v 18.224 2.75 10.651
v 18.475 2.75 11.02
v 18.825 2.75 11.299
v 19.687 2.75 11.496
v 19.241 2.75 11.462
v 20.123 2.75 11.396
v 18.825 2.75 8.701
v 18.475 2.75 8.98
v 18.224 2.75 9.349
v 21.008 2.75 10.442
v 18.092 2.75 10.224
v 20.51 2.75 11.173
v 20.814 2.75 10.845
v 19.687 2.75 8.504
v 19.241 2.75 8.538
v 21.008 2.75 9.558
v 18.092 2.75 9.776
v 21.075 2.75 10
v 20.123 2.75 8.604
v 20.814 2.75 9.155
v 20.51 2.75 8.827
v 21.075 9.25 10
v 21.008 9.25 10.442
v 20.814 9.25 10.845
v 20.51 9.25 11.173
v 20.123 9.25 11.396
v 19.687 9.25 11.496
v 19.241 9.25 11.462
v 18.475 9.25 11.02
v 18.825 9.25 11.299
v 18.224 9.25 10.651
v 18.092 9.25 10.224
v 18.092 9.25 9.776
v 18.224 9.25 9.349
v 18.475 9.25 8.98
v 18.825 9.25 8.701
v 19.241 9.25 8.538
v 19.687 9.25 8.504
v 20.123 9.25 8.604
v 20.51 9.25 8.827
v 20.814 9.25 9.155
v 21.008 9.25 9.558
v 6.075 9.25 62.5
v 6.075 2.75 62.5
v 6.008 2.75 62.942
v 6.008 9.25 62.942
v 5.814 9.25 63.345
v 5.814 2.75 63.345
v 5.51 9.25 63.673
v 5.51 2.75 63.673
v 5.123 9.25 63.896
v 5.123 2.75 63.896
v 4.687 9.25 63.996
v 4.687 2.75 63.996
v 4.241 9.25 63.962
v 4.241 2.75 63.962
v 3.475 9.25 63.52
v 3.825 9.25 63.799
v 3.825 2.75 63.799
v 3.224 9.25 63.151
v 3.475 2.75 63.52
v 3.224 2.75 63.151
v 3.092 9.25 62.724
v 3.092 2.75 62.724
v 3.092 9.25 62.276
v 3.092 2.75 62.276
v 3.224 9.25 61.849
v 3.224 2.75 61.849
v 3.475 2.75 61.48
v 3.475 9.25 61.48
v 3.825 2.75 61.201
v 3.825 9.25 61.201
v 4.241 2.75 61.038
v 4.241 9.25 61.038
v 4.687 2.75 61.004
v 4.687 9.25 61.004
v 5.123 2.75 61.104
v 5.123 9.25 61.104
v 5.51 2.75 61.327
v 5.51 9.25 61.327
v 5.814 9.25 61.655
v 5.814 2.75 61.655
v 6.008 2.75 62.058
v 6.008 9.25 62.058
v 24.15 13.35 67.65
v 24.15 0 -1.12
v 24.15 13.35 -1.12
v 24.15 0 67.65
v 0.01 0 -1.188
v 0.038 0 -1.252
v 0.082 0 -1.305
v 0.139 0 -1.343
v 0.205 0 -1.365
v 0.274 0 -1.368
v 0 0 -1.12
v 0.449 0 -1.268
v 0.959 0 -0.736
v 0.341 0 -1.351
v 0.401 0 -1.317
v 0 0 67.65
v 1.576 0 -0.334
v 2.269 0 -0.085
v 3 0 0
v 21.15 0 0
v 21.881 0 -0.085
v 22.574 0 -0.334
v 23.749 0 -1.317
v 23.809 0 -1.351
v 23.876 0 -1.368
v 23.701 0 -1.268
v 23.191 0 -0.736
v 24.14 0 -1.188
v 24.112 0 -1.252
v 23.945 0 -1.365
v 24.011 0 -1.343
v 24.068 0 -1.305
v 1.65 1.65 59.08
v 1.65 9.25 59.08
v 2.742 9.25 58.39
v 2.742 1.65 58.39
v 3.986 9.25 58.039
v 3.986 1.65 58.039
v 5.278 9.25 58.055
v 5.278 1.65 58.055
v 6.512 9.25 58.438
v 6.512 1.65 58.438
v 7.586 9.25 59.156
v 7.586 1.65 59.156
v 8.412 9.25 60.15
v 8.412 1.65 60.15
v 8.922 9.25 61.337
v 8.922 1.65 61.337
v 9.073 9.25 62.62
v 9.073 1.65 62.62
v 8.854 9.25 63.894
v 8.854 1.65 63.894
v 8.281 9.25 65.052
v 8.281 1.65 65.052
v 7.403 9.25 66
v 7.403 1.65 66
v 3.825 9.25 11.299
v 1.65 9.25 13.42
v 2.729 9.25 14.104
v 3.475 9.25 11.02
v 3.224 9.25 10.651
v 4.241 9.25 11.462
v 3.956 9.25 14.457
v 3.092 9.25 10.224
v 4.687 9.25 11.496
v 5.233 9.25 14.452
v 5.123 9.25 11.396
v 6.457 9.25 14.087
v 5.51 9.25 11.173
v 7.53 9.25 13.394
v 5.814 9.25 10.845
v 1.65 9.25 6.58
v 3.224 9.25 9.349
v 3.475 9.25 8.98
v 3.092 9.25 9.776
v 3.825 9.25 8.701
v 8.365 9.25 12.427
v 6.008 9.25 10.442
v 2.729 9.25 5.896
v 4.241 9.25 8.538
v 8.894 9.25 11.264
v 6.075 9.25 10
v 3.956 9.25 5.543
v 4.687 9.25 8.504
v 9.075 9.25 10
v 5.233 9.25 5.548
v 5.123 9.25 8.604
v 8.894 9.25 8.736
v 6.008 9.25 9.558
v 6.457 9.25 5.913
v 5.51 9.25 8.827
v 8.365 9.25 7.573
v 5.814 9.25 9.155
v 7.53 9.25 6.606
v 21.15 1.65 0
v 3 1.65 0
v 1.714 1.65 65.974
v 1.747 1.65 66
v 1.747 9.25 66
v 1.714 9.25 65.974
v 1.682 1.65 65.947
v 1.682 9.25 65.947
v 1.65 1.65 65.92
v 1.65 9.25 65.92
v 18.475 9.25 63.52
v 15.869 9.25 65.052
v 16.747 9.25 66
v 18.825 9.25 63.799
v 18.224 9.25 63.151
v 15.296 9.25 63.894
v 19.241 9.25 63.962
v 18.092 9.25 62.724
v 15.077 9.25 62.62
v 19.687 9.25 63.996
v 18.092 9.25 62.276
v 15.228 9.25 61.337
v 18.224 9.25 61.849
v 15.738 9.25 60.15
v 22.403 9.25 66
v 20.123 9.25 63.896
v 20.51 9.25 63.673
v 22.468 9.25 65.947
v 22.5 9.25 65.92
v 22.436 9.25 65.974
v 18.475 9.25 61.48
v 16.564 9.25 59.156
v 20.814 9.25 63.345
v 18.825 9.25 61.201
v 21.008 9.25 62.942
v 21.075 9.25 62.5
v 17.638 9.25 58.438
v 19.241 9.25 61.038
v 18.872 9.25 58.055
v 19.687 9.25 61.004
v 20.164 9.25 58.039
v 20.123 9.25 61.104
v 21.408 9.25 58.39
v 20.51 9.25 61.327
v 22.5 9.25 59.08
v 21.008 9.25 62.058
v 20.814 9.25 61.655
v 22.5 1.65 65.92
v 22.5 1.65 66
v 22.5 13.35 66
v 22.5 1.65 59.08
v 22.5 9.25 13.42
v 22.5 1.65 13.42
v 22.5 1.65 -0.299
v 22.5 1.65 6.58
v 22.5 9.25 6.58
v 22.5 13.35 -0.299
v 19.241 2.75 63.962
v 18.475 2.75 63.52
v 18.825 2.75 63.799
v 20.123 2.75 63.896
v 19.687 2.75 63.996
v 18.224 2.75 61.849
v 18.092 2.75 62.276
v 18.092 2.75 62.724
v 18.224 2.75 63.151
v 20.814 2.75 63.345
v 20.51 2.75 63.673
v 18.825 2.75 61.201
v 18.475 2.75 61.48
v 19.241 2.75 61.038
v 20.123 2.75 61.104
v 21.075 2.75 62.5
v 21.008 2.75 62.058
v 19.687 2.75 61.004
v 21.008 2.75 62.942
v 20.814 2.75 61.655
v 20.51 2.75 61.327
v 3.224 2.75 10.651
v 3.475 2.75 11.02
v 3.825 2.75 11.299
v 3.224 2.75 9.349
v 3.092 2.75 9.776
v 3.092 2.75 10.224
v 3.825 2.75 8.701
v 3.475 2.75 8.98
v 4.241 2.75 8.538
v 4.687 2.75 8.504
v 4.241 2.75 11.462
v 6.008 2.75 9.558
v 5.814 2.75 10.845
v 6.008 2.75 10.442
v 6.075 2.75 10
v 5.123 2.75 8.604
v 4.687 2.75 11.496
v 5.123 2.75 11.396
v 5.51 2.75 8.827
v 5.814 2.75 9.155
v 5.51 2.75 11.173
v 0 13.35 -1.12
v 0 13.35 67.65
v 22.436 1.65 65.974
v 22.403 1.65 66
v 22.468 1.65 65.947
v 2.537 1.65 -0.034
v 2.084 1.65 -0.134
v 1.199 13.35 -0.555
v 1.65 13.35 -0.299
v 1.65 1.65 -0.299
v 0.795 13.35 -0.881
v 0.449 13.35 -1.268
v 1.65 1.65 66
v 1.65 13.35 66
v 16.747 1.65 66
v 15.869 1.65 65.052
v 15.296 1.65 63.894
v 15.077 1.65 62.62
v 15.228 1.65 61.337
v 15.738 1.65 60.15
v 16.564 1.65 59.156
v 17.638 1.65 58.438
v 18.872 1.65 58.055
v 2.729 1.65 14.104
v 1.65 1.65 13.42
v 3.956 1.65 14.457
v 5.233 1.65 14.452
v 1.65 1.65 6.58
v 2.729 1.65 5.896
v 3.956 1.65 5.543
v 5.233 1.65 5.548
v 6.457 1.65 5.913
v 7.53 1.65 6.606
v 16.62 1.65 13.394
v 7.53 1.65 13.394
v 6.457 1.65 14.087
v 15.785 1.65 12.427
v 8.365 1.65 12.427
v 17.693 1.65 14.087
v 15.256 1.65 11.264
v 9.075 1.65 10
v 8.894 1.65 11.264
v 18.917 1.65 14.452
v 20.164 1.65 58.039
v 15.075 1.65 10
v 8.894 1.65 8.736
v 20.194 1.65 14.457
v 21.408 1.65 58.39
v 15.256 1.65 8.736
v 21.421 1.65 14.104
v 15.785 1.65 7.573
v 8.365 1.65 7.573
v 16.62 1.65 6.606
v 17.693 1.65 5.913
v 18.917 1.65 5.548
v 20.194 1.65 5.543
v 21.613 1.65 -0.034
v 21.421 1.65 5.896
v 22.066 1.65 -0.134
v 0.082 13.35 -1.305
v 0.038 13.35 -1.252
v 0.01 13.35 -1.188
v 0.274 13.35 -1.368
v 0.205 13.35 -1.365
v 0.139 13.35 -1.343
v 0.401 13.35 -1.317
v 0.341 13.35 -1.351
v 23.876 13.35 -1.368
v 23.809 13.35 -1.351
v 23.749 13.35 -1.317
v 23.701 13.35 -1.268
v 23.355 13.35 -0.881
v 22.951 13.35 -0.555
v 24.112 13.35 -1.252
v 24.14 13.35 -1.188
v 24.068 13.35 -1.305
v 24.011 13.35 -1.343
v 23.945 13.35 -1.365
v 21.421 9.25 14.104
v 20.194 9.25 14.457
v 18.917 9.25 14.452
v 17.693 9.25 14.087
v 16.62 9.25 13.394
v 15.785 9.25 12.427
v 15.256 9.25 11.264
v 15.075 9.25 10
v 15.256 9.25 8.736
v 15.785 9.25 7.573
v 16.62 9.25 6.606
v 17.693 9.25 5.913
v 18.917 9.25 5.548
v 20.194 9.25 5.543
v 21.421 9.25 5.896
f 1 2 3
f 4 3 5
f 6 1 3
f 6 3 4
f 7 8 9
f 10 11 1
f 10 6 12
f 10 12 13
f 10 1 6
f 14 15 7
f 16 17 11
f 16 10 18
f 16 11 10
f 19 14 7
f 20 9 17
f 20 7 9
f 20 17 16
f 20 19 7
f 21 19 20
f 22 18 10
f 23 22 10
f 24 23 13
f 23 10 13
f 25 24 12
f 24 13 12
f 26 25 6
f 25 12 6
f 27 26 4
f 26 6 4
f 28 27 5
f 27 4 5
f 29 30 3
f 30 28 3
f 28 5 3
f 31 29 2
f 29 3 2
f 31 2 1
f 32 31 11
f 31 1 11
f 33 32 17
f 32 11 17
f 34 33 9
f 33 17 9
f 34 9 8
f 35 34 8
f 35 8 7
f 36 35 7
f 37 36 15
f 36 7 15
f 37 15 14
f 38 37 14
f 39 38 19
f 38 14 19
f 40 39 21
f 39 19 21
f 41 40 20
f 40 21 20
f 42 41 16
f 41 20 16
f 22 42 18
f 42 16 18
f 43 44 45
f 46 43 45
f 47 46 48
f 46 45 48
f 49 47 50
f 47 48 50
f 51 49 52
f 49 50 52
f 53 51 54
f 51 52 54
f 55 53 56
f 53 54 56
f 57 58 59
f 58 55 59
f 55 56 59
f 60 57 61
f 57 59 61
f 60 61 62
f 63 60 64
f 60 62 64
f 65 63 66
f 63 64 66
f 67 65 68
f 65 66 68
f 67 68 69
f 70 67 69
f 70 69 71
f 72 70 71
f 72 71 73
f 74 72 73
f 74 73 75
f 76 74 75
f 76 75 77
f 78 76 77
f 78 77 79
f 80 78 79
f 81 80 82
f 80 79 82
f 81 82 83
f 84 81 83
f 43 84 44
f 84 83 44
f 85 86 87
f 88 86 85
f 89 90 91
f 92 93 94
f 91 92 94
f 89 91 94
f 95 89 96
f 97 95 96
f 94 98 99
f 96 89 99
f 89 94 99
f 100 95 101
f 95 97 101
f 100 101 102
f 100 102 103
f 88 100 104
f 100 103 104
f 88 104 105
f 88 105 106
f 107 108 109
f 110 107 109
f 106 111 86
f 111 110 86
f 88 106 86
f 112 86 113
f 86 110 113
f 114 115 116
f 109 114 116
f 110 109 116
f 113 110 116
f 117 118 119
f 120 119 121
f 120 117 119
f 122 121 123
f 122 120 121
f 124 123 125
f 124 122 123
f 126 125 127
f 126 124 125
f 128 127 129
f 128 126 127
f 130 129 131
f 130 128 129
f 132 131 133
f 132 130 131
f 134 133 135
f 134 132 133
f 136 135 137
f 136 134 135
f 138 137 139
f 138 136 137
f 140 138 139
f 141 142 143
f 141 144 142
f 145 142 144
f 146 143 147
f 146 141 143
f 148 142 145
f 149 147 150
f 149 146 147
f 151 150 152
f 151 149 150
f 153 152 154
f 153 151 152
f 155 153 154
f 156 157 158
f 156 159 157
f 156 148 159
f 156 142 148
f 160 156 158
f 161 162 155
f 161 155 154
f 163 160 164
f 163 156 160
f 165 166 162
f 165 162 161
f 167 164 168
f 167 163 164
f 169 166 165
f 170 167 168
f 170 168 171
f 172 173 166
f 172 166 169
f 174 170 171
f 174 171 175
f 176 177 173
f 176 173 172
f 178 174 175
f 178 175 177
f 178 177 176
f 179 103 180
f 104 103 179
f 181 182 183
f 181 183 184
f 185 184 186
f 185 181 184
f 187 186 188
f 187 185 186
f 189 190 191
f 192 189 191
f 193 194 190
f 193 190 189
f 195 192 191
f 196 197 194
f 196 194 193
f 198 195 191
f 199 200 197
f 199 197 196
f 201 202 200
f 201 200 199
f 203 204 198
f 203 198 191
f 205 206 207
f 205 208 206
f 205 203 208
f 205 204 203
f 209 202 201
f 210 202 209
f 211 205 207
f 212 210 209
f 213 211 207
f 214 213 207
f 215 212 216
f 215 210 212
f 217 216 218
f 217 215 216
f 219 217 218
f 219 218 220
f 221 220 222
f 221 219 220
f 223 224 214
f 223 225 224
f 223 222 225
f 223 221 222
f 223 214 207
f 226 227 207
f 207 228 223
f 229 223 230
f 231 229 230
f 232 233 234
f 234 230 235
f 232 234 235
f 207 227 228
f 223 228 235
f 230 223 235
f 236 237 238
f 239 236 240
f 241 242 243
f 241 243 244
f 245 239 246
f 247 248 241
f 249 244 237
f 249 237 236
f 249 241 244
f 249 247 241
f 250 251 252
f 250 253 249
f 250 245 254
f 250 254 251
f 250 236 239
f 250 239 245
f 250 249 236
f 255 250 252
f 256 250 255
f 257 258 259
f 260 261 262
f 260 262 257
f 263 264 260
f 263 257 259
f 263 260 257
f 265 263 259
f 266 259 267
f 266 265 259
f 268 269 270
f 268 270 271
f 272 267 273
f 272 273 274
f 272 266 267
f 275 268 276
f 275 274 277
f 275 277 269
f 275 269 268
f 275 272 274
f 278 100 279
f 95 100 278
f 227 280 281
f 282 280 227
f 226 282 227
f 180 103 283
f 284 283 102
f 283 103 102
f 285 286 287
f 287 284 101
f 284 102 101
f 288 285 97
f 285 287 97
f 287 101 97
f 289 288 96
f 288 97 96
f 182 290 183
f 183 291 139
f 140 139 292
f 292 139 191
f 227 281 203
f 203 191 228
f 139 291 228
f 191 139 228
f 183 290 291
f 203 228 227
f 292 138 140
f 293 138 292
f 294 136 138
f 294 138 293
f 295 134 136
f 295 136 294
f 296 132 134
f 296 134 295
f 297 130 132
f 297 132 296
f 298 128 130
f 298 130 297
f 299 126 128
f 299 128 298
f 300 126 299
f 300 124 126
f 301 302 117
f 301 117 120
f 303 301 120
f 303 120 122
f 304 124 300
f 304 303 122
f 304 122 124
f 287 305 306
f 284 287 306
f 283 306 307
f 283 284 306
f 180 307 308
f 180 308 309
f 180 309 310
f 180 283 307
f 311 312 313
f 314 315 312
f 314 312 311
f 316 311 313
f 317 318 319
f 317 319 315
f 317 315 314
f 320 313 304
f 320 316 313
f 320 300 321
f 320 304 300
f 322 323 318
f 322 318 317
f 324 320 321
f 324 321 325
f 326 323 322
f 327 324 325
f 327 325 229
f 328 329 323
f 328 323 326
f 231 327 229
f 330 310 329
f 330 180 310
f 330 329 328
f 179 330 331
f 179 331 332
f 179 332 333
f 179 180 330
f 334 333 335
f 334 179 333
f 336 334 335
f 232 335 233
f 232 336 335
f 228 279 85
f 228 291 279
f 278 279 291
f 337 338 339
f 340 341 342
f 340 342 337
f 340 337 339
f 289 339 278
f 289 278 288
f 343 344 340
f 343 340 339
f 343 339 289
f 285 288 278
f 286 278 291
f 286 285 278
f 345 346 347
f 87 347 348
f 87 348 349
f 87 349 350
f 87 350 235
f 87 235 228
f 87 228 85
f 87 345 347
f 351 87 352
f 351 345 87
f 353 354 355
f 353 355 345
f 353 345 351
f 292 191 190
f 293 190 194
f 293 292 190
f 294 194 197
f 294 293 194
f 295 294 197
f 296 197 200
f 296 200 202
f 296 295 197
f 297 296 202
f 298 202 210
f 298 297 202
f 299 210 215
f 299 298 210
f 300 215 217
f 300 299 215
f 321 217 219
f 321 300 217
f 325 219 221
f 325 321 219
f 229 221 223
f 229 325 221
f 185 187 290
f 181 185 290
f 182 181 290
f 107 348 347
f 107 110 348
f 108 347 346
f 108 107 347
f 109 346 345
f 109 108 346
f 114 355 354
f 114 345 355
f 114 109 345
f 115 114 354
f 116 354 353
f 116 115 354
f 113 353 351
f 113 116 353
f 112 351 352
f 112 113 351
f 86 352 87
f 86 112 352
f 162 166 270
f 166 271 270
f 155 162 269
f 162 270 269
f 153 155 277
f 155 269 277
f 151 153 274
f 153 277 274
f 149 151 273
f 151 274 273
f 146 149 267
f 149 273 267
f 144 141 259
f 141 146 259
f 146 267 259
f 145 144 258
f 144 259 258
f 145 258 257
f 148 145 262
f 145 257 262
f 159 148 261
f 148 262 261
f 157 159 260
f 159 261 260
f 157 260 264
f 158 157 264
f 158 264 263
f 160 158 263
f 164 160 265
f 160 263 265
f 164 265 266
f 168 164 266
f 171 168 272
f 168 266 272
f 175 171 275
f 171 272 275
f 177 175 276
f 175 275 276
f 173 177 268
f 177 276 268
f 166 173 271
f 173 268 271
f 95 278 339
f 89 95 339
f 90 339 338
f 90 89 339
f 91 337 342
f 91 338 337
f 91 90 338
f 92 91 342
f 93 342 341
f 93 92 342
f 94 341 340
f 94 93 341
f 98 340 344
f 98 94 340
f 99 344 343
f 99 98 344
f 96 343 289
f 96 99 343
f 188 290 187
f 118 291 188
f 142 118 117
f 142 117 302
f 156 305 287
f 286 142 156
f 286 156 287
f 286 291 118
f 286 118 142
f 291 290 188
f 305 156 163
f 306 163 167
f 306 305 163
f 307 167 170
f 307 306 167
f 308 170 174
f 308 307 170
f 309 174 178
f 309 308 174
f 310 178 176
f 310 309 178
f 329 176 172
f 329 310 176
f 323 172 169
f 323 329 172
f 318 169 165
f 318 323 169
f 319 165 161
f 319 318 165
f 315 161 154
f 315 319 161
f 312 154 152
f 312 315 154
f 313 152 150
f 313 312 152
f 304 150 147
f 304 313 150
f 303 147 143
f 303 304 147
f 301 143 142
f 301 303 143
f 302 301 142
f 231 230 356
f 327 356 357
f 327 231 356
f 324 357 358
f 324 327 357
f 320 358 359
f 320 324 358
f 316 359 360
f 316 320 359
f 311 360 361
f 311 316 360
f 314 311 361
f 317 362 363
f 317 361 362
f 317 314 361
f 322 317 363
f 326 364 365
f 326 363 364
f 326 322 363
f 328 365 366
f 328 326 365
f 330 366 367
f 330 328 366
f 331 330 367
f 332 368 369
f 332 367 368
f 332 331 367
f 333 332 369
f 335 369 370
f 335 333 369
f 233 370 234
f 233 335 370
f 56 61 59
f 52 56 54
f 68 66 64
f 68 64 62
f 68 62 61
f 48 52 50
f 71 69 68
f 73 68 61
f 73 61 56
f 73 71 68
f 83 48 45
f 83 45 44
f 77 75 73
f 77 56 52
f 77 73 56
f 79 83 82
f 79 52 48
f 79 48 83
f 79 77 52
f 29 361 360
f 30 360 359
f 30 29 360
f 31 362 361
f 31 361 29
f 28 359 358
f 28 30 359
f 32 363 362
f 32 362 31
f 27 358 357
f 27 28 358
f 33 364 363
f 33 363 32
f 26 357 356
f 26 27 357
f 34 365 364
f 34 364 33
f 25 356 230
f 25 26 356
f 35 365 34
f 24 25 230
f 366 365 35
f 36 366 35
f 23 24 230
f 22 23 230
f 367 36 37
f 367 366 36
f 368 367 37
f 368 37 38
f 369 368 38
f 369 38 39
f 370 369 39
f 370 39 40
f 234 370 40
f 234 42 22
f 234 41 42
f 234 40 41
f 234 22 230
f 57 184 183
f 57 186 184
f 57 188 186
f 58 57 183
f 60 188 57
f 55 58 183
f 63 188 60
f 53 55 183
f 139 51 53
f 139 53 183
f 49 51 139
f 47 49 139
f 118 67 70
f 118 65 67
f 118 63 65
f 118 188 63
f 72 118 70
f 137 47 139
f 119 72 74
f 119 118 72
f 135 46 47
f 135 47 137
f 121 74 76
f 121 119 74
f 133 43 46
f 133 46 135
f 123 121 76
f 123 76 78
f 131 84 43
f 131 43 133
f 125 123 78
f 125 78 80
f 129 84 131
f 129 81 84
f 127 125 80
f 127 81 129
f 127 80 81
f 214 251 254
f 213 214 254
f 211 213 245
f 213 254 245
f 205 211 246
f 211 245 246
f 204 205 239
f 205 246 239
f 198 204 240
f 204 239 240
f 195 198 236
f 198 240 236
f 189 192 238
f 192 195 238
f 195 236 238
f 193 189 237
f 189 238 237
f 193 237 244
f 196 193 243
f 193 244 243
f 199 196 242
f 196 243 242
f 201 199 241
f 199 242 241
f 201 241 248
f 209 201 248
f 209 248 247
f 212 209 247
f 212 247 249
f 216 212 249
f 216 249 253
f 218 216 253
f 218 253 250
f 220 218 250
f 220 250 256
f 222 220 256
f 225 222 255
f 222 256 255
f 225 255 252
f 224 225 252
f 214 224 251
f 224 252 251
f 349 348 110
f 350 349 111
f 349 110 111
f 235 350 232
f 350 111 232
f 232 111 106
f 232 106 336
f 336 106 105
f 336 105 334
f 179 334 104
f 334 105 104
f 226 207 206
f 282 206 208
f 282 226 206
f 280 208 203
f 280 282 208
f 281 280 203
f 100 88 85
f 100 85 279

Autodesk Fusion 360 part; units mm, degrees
sketch "スケッチ3" plane through (0, 0, 0) normal (0, 1, 0) x (1, 0, 0)
  line L0 (0, 0) -> (24.15, 0)
  line L1 (24.15, 0) -> (24.15, -67.65)
  line L2 (24.15, -67.65) -> (0, -67.65)
  line L3 (0, -67.65) -> (0, 0)
  arc A0 (21.15, 0) -> (23.7006, 1.2675) centre (21.15, 3.2) ccw
  line L4 (21.15, 3.2) -> (21.15, 0) construction
  line L5 (21.15, 3.2) -> (23.7006, 1.2675) construction
  line L6 (24.15, 0) -> (24.15, 1.12)
  arc A1 (24.15, 1.12) -> (23.7006, 1.2675) centre (23.9011, 1.12) ccw
  line L7 (22.5, -67.65) -> (22.5, 0.2987)
  line L8 (0, -66) -> (24, -66)
  circle A2 centre (19.575, -10) radius 1.5
  line L9 (12.075, -67.65) -> (12.075, 0)
  circle A3 centre (19.575, -62.5) radius 1.5
  arc A4 (0.4494, 1.2675) -> (3, 0) centre (3, 3.2) ccw
  line L10 (0, 0) -> (0, 1.12)
  arc A5 (0.4494, 1.2675) -> (0, 1.12) centre (0.2489, 1.12) ccw
  line L11 (1.65, -67.65) -> (1.65, 0.2987)
  circle A6 centre (4.575, -62.5) radius 1.5
  circle A7 centre (4.575, -10) radius 1.5
  circle A8 centre (6.575, -46.5) radius 1
  circle A9 centre (19.575, -62.5) radius 4.5
  circle A10 centre (19.575, -10) radius 4.5
  circle A11 centre (4.575, -62.5) radius 4.5
  circle A12 centre (4.575, -10) radius 4.5
  point P0 (21.15, 0)
  point P1 (21.15, 3.2)
  point P2 (23.9, 0.8469)
  dimension "d1" = 24.15
  dimension "d4" = 3.2
  dimension "d5" = 3
  dimension "d6" = 52.85
  dimension "d10" = 1.12
  dimension "d12" = 1.65
  dimension "d13" = 1.65
  dimension "d14" = 3
  dimension "d15" = 10
  dimension "d16" = 12.075
  dimension "d17" = 7.5
  dimension "d18" = 3
  dimension "d19" = 62.5
  dimension "d20" = 66
  dimension "d21" = 2
  dimension "d22" = 5.5
  dimension "d23" = 46.5
  dimension "d31" = 9
  dimension "d32" = 9
  dimension "d33" = 7.5
extrude "押し出し1" add sketch "スケッチ3" along normal blind 13.35 contours L0 L8 L9 L11 A11 A12 | L0 A4 L11 | L0 L7 L8 L9 A9 A10 | L0 L3 L8 L11 A11 A12 | L0 A4 L10 A5 L11 | L0 A0 L7 | L2 L8 L9 L11 A11 | L2 L7 L8 L9 A9 | L11 A12 | L11 A12 | L0 A0 L6 A1 L7 | L0 L1 L2 L7 A9 A10 | L8 A11 | L8 L11 A11 | L7 L8 A9 | L8 A9 | L2 L3 L8 L11 | L7 A10 | L7 A10 | L8 L11 A11 | L7 L8 A9 | L7 A9 | L11 A11 | A2 | A3 | A6 | A7 | A8
extrude "押し出し3" cut sketch "スケッチ3" against normal blind 11.7 from surface at 13.35 contours L0 L8 L9 L11 A11 A12 | L0 A4 L11 | L0 L7 L8 L9 A9 A10 | L0 A0 L7 | L11 A12 | L8 L11 A11 | L7 L8 A9 | L7 A10 | L8 L11 A11 | L7 L8 A9 | A2 | A3 | A6 | A7 | A8 picked at (2.125, -10) picked at (22.025, -10)
extrude "押し出し4" add sketch "スケッチ3" along normal blind 9.25 contours L11 A12 | L8 A11 | L8 L11 A11 | L7 L8 A9 | L8 A9 | L7 A10 picked at (2.125, -10) picked at (4.6124, -65.3319) picked at (19.5376, -65.3319) picked at (22.025, -10)
extrude "押し出し5" add sketch "スケッチ3" along normal blind 2.75 contours A2 | A3 | A6 | A7
